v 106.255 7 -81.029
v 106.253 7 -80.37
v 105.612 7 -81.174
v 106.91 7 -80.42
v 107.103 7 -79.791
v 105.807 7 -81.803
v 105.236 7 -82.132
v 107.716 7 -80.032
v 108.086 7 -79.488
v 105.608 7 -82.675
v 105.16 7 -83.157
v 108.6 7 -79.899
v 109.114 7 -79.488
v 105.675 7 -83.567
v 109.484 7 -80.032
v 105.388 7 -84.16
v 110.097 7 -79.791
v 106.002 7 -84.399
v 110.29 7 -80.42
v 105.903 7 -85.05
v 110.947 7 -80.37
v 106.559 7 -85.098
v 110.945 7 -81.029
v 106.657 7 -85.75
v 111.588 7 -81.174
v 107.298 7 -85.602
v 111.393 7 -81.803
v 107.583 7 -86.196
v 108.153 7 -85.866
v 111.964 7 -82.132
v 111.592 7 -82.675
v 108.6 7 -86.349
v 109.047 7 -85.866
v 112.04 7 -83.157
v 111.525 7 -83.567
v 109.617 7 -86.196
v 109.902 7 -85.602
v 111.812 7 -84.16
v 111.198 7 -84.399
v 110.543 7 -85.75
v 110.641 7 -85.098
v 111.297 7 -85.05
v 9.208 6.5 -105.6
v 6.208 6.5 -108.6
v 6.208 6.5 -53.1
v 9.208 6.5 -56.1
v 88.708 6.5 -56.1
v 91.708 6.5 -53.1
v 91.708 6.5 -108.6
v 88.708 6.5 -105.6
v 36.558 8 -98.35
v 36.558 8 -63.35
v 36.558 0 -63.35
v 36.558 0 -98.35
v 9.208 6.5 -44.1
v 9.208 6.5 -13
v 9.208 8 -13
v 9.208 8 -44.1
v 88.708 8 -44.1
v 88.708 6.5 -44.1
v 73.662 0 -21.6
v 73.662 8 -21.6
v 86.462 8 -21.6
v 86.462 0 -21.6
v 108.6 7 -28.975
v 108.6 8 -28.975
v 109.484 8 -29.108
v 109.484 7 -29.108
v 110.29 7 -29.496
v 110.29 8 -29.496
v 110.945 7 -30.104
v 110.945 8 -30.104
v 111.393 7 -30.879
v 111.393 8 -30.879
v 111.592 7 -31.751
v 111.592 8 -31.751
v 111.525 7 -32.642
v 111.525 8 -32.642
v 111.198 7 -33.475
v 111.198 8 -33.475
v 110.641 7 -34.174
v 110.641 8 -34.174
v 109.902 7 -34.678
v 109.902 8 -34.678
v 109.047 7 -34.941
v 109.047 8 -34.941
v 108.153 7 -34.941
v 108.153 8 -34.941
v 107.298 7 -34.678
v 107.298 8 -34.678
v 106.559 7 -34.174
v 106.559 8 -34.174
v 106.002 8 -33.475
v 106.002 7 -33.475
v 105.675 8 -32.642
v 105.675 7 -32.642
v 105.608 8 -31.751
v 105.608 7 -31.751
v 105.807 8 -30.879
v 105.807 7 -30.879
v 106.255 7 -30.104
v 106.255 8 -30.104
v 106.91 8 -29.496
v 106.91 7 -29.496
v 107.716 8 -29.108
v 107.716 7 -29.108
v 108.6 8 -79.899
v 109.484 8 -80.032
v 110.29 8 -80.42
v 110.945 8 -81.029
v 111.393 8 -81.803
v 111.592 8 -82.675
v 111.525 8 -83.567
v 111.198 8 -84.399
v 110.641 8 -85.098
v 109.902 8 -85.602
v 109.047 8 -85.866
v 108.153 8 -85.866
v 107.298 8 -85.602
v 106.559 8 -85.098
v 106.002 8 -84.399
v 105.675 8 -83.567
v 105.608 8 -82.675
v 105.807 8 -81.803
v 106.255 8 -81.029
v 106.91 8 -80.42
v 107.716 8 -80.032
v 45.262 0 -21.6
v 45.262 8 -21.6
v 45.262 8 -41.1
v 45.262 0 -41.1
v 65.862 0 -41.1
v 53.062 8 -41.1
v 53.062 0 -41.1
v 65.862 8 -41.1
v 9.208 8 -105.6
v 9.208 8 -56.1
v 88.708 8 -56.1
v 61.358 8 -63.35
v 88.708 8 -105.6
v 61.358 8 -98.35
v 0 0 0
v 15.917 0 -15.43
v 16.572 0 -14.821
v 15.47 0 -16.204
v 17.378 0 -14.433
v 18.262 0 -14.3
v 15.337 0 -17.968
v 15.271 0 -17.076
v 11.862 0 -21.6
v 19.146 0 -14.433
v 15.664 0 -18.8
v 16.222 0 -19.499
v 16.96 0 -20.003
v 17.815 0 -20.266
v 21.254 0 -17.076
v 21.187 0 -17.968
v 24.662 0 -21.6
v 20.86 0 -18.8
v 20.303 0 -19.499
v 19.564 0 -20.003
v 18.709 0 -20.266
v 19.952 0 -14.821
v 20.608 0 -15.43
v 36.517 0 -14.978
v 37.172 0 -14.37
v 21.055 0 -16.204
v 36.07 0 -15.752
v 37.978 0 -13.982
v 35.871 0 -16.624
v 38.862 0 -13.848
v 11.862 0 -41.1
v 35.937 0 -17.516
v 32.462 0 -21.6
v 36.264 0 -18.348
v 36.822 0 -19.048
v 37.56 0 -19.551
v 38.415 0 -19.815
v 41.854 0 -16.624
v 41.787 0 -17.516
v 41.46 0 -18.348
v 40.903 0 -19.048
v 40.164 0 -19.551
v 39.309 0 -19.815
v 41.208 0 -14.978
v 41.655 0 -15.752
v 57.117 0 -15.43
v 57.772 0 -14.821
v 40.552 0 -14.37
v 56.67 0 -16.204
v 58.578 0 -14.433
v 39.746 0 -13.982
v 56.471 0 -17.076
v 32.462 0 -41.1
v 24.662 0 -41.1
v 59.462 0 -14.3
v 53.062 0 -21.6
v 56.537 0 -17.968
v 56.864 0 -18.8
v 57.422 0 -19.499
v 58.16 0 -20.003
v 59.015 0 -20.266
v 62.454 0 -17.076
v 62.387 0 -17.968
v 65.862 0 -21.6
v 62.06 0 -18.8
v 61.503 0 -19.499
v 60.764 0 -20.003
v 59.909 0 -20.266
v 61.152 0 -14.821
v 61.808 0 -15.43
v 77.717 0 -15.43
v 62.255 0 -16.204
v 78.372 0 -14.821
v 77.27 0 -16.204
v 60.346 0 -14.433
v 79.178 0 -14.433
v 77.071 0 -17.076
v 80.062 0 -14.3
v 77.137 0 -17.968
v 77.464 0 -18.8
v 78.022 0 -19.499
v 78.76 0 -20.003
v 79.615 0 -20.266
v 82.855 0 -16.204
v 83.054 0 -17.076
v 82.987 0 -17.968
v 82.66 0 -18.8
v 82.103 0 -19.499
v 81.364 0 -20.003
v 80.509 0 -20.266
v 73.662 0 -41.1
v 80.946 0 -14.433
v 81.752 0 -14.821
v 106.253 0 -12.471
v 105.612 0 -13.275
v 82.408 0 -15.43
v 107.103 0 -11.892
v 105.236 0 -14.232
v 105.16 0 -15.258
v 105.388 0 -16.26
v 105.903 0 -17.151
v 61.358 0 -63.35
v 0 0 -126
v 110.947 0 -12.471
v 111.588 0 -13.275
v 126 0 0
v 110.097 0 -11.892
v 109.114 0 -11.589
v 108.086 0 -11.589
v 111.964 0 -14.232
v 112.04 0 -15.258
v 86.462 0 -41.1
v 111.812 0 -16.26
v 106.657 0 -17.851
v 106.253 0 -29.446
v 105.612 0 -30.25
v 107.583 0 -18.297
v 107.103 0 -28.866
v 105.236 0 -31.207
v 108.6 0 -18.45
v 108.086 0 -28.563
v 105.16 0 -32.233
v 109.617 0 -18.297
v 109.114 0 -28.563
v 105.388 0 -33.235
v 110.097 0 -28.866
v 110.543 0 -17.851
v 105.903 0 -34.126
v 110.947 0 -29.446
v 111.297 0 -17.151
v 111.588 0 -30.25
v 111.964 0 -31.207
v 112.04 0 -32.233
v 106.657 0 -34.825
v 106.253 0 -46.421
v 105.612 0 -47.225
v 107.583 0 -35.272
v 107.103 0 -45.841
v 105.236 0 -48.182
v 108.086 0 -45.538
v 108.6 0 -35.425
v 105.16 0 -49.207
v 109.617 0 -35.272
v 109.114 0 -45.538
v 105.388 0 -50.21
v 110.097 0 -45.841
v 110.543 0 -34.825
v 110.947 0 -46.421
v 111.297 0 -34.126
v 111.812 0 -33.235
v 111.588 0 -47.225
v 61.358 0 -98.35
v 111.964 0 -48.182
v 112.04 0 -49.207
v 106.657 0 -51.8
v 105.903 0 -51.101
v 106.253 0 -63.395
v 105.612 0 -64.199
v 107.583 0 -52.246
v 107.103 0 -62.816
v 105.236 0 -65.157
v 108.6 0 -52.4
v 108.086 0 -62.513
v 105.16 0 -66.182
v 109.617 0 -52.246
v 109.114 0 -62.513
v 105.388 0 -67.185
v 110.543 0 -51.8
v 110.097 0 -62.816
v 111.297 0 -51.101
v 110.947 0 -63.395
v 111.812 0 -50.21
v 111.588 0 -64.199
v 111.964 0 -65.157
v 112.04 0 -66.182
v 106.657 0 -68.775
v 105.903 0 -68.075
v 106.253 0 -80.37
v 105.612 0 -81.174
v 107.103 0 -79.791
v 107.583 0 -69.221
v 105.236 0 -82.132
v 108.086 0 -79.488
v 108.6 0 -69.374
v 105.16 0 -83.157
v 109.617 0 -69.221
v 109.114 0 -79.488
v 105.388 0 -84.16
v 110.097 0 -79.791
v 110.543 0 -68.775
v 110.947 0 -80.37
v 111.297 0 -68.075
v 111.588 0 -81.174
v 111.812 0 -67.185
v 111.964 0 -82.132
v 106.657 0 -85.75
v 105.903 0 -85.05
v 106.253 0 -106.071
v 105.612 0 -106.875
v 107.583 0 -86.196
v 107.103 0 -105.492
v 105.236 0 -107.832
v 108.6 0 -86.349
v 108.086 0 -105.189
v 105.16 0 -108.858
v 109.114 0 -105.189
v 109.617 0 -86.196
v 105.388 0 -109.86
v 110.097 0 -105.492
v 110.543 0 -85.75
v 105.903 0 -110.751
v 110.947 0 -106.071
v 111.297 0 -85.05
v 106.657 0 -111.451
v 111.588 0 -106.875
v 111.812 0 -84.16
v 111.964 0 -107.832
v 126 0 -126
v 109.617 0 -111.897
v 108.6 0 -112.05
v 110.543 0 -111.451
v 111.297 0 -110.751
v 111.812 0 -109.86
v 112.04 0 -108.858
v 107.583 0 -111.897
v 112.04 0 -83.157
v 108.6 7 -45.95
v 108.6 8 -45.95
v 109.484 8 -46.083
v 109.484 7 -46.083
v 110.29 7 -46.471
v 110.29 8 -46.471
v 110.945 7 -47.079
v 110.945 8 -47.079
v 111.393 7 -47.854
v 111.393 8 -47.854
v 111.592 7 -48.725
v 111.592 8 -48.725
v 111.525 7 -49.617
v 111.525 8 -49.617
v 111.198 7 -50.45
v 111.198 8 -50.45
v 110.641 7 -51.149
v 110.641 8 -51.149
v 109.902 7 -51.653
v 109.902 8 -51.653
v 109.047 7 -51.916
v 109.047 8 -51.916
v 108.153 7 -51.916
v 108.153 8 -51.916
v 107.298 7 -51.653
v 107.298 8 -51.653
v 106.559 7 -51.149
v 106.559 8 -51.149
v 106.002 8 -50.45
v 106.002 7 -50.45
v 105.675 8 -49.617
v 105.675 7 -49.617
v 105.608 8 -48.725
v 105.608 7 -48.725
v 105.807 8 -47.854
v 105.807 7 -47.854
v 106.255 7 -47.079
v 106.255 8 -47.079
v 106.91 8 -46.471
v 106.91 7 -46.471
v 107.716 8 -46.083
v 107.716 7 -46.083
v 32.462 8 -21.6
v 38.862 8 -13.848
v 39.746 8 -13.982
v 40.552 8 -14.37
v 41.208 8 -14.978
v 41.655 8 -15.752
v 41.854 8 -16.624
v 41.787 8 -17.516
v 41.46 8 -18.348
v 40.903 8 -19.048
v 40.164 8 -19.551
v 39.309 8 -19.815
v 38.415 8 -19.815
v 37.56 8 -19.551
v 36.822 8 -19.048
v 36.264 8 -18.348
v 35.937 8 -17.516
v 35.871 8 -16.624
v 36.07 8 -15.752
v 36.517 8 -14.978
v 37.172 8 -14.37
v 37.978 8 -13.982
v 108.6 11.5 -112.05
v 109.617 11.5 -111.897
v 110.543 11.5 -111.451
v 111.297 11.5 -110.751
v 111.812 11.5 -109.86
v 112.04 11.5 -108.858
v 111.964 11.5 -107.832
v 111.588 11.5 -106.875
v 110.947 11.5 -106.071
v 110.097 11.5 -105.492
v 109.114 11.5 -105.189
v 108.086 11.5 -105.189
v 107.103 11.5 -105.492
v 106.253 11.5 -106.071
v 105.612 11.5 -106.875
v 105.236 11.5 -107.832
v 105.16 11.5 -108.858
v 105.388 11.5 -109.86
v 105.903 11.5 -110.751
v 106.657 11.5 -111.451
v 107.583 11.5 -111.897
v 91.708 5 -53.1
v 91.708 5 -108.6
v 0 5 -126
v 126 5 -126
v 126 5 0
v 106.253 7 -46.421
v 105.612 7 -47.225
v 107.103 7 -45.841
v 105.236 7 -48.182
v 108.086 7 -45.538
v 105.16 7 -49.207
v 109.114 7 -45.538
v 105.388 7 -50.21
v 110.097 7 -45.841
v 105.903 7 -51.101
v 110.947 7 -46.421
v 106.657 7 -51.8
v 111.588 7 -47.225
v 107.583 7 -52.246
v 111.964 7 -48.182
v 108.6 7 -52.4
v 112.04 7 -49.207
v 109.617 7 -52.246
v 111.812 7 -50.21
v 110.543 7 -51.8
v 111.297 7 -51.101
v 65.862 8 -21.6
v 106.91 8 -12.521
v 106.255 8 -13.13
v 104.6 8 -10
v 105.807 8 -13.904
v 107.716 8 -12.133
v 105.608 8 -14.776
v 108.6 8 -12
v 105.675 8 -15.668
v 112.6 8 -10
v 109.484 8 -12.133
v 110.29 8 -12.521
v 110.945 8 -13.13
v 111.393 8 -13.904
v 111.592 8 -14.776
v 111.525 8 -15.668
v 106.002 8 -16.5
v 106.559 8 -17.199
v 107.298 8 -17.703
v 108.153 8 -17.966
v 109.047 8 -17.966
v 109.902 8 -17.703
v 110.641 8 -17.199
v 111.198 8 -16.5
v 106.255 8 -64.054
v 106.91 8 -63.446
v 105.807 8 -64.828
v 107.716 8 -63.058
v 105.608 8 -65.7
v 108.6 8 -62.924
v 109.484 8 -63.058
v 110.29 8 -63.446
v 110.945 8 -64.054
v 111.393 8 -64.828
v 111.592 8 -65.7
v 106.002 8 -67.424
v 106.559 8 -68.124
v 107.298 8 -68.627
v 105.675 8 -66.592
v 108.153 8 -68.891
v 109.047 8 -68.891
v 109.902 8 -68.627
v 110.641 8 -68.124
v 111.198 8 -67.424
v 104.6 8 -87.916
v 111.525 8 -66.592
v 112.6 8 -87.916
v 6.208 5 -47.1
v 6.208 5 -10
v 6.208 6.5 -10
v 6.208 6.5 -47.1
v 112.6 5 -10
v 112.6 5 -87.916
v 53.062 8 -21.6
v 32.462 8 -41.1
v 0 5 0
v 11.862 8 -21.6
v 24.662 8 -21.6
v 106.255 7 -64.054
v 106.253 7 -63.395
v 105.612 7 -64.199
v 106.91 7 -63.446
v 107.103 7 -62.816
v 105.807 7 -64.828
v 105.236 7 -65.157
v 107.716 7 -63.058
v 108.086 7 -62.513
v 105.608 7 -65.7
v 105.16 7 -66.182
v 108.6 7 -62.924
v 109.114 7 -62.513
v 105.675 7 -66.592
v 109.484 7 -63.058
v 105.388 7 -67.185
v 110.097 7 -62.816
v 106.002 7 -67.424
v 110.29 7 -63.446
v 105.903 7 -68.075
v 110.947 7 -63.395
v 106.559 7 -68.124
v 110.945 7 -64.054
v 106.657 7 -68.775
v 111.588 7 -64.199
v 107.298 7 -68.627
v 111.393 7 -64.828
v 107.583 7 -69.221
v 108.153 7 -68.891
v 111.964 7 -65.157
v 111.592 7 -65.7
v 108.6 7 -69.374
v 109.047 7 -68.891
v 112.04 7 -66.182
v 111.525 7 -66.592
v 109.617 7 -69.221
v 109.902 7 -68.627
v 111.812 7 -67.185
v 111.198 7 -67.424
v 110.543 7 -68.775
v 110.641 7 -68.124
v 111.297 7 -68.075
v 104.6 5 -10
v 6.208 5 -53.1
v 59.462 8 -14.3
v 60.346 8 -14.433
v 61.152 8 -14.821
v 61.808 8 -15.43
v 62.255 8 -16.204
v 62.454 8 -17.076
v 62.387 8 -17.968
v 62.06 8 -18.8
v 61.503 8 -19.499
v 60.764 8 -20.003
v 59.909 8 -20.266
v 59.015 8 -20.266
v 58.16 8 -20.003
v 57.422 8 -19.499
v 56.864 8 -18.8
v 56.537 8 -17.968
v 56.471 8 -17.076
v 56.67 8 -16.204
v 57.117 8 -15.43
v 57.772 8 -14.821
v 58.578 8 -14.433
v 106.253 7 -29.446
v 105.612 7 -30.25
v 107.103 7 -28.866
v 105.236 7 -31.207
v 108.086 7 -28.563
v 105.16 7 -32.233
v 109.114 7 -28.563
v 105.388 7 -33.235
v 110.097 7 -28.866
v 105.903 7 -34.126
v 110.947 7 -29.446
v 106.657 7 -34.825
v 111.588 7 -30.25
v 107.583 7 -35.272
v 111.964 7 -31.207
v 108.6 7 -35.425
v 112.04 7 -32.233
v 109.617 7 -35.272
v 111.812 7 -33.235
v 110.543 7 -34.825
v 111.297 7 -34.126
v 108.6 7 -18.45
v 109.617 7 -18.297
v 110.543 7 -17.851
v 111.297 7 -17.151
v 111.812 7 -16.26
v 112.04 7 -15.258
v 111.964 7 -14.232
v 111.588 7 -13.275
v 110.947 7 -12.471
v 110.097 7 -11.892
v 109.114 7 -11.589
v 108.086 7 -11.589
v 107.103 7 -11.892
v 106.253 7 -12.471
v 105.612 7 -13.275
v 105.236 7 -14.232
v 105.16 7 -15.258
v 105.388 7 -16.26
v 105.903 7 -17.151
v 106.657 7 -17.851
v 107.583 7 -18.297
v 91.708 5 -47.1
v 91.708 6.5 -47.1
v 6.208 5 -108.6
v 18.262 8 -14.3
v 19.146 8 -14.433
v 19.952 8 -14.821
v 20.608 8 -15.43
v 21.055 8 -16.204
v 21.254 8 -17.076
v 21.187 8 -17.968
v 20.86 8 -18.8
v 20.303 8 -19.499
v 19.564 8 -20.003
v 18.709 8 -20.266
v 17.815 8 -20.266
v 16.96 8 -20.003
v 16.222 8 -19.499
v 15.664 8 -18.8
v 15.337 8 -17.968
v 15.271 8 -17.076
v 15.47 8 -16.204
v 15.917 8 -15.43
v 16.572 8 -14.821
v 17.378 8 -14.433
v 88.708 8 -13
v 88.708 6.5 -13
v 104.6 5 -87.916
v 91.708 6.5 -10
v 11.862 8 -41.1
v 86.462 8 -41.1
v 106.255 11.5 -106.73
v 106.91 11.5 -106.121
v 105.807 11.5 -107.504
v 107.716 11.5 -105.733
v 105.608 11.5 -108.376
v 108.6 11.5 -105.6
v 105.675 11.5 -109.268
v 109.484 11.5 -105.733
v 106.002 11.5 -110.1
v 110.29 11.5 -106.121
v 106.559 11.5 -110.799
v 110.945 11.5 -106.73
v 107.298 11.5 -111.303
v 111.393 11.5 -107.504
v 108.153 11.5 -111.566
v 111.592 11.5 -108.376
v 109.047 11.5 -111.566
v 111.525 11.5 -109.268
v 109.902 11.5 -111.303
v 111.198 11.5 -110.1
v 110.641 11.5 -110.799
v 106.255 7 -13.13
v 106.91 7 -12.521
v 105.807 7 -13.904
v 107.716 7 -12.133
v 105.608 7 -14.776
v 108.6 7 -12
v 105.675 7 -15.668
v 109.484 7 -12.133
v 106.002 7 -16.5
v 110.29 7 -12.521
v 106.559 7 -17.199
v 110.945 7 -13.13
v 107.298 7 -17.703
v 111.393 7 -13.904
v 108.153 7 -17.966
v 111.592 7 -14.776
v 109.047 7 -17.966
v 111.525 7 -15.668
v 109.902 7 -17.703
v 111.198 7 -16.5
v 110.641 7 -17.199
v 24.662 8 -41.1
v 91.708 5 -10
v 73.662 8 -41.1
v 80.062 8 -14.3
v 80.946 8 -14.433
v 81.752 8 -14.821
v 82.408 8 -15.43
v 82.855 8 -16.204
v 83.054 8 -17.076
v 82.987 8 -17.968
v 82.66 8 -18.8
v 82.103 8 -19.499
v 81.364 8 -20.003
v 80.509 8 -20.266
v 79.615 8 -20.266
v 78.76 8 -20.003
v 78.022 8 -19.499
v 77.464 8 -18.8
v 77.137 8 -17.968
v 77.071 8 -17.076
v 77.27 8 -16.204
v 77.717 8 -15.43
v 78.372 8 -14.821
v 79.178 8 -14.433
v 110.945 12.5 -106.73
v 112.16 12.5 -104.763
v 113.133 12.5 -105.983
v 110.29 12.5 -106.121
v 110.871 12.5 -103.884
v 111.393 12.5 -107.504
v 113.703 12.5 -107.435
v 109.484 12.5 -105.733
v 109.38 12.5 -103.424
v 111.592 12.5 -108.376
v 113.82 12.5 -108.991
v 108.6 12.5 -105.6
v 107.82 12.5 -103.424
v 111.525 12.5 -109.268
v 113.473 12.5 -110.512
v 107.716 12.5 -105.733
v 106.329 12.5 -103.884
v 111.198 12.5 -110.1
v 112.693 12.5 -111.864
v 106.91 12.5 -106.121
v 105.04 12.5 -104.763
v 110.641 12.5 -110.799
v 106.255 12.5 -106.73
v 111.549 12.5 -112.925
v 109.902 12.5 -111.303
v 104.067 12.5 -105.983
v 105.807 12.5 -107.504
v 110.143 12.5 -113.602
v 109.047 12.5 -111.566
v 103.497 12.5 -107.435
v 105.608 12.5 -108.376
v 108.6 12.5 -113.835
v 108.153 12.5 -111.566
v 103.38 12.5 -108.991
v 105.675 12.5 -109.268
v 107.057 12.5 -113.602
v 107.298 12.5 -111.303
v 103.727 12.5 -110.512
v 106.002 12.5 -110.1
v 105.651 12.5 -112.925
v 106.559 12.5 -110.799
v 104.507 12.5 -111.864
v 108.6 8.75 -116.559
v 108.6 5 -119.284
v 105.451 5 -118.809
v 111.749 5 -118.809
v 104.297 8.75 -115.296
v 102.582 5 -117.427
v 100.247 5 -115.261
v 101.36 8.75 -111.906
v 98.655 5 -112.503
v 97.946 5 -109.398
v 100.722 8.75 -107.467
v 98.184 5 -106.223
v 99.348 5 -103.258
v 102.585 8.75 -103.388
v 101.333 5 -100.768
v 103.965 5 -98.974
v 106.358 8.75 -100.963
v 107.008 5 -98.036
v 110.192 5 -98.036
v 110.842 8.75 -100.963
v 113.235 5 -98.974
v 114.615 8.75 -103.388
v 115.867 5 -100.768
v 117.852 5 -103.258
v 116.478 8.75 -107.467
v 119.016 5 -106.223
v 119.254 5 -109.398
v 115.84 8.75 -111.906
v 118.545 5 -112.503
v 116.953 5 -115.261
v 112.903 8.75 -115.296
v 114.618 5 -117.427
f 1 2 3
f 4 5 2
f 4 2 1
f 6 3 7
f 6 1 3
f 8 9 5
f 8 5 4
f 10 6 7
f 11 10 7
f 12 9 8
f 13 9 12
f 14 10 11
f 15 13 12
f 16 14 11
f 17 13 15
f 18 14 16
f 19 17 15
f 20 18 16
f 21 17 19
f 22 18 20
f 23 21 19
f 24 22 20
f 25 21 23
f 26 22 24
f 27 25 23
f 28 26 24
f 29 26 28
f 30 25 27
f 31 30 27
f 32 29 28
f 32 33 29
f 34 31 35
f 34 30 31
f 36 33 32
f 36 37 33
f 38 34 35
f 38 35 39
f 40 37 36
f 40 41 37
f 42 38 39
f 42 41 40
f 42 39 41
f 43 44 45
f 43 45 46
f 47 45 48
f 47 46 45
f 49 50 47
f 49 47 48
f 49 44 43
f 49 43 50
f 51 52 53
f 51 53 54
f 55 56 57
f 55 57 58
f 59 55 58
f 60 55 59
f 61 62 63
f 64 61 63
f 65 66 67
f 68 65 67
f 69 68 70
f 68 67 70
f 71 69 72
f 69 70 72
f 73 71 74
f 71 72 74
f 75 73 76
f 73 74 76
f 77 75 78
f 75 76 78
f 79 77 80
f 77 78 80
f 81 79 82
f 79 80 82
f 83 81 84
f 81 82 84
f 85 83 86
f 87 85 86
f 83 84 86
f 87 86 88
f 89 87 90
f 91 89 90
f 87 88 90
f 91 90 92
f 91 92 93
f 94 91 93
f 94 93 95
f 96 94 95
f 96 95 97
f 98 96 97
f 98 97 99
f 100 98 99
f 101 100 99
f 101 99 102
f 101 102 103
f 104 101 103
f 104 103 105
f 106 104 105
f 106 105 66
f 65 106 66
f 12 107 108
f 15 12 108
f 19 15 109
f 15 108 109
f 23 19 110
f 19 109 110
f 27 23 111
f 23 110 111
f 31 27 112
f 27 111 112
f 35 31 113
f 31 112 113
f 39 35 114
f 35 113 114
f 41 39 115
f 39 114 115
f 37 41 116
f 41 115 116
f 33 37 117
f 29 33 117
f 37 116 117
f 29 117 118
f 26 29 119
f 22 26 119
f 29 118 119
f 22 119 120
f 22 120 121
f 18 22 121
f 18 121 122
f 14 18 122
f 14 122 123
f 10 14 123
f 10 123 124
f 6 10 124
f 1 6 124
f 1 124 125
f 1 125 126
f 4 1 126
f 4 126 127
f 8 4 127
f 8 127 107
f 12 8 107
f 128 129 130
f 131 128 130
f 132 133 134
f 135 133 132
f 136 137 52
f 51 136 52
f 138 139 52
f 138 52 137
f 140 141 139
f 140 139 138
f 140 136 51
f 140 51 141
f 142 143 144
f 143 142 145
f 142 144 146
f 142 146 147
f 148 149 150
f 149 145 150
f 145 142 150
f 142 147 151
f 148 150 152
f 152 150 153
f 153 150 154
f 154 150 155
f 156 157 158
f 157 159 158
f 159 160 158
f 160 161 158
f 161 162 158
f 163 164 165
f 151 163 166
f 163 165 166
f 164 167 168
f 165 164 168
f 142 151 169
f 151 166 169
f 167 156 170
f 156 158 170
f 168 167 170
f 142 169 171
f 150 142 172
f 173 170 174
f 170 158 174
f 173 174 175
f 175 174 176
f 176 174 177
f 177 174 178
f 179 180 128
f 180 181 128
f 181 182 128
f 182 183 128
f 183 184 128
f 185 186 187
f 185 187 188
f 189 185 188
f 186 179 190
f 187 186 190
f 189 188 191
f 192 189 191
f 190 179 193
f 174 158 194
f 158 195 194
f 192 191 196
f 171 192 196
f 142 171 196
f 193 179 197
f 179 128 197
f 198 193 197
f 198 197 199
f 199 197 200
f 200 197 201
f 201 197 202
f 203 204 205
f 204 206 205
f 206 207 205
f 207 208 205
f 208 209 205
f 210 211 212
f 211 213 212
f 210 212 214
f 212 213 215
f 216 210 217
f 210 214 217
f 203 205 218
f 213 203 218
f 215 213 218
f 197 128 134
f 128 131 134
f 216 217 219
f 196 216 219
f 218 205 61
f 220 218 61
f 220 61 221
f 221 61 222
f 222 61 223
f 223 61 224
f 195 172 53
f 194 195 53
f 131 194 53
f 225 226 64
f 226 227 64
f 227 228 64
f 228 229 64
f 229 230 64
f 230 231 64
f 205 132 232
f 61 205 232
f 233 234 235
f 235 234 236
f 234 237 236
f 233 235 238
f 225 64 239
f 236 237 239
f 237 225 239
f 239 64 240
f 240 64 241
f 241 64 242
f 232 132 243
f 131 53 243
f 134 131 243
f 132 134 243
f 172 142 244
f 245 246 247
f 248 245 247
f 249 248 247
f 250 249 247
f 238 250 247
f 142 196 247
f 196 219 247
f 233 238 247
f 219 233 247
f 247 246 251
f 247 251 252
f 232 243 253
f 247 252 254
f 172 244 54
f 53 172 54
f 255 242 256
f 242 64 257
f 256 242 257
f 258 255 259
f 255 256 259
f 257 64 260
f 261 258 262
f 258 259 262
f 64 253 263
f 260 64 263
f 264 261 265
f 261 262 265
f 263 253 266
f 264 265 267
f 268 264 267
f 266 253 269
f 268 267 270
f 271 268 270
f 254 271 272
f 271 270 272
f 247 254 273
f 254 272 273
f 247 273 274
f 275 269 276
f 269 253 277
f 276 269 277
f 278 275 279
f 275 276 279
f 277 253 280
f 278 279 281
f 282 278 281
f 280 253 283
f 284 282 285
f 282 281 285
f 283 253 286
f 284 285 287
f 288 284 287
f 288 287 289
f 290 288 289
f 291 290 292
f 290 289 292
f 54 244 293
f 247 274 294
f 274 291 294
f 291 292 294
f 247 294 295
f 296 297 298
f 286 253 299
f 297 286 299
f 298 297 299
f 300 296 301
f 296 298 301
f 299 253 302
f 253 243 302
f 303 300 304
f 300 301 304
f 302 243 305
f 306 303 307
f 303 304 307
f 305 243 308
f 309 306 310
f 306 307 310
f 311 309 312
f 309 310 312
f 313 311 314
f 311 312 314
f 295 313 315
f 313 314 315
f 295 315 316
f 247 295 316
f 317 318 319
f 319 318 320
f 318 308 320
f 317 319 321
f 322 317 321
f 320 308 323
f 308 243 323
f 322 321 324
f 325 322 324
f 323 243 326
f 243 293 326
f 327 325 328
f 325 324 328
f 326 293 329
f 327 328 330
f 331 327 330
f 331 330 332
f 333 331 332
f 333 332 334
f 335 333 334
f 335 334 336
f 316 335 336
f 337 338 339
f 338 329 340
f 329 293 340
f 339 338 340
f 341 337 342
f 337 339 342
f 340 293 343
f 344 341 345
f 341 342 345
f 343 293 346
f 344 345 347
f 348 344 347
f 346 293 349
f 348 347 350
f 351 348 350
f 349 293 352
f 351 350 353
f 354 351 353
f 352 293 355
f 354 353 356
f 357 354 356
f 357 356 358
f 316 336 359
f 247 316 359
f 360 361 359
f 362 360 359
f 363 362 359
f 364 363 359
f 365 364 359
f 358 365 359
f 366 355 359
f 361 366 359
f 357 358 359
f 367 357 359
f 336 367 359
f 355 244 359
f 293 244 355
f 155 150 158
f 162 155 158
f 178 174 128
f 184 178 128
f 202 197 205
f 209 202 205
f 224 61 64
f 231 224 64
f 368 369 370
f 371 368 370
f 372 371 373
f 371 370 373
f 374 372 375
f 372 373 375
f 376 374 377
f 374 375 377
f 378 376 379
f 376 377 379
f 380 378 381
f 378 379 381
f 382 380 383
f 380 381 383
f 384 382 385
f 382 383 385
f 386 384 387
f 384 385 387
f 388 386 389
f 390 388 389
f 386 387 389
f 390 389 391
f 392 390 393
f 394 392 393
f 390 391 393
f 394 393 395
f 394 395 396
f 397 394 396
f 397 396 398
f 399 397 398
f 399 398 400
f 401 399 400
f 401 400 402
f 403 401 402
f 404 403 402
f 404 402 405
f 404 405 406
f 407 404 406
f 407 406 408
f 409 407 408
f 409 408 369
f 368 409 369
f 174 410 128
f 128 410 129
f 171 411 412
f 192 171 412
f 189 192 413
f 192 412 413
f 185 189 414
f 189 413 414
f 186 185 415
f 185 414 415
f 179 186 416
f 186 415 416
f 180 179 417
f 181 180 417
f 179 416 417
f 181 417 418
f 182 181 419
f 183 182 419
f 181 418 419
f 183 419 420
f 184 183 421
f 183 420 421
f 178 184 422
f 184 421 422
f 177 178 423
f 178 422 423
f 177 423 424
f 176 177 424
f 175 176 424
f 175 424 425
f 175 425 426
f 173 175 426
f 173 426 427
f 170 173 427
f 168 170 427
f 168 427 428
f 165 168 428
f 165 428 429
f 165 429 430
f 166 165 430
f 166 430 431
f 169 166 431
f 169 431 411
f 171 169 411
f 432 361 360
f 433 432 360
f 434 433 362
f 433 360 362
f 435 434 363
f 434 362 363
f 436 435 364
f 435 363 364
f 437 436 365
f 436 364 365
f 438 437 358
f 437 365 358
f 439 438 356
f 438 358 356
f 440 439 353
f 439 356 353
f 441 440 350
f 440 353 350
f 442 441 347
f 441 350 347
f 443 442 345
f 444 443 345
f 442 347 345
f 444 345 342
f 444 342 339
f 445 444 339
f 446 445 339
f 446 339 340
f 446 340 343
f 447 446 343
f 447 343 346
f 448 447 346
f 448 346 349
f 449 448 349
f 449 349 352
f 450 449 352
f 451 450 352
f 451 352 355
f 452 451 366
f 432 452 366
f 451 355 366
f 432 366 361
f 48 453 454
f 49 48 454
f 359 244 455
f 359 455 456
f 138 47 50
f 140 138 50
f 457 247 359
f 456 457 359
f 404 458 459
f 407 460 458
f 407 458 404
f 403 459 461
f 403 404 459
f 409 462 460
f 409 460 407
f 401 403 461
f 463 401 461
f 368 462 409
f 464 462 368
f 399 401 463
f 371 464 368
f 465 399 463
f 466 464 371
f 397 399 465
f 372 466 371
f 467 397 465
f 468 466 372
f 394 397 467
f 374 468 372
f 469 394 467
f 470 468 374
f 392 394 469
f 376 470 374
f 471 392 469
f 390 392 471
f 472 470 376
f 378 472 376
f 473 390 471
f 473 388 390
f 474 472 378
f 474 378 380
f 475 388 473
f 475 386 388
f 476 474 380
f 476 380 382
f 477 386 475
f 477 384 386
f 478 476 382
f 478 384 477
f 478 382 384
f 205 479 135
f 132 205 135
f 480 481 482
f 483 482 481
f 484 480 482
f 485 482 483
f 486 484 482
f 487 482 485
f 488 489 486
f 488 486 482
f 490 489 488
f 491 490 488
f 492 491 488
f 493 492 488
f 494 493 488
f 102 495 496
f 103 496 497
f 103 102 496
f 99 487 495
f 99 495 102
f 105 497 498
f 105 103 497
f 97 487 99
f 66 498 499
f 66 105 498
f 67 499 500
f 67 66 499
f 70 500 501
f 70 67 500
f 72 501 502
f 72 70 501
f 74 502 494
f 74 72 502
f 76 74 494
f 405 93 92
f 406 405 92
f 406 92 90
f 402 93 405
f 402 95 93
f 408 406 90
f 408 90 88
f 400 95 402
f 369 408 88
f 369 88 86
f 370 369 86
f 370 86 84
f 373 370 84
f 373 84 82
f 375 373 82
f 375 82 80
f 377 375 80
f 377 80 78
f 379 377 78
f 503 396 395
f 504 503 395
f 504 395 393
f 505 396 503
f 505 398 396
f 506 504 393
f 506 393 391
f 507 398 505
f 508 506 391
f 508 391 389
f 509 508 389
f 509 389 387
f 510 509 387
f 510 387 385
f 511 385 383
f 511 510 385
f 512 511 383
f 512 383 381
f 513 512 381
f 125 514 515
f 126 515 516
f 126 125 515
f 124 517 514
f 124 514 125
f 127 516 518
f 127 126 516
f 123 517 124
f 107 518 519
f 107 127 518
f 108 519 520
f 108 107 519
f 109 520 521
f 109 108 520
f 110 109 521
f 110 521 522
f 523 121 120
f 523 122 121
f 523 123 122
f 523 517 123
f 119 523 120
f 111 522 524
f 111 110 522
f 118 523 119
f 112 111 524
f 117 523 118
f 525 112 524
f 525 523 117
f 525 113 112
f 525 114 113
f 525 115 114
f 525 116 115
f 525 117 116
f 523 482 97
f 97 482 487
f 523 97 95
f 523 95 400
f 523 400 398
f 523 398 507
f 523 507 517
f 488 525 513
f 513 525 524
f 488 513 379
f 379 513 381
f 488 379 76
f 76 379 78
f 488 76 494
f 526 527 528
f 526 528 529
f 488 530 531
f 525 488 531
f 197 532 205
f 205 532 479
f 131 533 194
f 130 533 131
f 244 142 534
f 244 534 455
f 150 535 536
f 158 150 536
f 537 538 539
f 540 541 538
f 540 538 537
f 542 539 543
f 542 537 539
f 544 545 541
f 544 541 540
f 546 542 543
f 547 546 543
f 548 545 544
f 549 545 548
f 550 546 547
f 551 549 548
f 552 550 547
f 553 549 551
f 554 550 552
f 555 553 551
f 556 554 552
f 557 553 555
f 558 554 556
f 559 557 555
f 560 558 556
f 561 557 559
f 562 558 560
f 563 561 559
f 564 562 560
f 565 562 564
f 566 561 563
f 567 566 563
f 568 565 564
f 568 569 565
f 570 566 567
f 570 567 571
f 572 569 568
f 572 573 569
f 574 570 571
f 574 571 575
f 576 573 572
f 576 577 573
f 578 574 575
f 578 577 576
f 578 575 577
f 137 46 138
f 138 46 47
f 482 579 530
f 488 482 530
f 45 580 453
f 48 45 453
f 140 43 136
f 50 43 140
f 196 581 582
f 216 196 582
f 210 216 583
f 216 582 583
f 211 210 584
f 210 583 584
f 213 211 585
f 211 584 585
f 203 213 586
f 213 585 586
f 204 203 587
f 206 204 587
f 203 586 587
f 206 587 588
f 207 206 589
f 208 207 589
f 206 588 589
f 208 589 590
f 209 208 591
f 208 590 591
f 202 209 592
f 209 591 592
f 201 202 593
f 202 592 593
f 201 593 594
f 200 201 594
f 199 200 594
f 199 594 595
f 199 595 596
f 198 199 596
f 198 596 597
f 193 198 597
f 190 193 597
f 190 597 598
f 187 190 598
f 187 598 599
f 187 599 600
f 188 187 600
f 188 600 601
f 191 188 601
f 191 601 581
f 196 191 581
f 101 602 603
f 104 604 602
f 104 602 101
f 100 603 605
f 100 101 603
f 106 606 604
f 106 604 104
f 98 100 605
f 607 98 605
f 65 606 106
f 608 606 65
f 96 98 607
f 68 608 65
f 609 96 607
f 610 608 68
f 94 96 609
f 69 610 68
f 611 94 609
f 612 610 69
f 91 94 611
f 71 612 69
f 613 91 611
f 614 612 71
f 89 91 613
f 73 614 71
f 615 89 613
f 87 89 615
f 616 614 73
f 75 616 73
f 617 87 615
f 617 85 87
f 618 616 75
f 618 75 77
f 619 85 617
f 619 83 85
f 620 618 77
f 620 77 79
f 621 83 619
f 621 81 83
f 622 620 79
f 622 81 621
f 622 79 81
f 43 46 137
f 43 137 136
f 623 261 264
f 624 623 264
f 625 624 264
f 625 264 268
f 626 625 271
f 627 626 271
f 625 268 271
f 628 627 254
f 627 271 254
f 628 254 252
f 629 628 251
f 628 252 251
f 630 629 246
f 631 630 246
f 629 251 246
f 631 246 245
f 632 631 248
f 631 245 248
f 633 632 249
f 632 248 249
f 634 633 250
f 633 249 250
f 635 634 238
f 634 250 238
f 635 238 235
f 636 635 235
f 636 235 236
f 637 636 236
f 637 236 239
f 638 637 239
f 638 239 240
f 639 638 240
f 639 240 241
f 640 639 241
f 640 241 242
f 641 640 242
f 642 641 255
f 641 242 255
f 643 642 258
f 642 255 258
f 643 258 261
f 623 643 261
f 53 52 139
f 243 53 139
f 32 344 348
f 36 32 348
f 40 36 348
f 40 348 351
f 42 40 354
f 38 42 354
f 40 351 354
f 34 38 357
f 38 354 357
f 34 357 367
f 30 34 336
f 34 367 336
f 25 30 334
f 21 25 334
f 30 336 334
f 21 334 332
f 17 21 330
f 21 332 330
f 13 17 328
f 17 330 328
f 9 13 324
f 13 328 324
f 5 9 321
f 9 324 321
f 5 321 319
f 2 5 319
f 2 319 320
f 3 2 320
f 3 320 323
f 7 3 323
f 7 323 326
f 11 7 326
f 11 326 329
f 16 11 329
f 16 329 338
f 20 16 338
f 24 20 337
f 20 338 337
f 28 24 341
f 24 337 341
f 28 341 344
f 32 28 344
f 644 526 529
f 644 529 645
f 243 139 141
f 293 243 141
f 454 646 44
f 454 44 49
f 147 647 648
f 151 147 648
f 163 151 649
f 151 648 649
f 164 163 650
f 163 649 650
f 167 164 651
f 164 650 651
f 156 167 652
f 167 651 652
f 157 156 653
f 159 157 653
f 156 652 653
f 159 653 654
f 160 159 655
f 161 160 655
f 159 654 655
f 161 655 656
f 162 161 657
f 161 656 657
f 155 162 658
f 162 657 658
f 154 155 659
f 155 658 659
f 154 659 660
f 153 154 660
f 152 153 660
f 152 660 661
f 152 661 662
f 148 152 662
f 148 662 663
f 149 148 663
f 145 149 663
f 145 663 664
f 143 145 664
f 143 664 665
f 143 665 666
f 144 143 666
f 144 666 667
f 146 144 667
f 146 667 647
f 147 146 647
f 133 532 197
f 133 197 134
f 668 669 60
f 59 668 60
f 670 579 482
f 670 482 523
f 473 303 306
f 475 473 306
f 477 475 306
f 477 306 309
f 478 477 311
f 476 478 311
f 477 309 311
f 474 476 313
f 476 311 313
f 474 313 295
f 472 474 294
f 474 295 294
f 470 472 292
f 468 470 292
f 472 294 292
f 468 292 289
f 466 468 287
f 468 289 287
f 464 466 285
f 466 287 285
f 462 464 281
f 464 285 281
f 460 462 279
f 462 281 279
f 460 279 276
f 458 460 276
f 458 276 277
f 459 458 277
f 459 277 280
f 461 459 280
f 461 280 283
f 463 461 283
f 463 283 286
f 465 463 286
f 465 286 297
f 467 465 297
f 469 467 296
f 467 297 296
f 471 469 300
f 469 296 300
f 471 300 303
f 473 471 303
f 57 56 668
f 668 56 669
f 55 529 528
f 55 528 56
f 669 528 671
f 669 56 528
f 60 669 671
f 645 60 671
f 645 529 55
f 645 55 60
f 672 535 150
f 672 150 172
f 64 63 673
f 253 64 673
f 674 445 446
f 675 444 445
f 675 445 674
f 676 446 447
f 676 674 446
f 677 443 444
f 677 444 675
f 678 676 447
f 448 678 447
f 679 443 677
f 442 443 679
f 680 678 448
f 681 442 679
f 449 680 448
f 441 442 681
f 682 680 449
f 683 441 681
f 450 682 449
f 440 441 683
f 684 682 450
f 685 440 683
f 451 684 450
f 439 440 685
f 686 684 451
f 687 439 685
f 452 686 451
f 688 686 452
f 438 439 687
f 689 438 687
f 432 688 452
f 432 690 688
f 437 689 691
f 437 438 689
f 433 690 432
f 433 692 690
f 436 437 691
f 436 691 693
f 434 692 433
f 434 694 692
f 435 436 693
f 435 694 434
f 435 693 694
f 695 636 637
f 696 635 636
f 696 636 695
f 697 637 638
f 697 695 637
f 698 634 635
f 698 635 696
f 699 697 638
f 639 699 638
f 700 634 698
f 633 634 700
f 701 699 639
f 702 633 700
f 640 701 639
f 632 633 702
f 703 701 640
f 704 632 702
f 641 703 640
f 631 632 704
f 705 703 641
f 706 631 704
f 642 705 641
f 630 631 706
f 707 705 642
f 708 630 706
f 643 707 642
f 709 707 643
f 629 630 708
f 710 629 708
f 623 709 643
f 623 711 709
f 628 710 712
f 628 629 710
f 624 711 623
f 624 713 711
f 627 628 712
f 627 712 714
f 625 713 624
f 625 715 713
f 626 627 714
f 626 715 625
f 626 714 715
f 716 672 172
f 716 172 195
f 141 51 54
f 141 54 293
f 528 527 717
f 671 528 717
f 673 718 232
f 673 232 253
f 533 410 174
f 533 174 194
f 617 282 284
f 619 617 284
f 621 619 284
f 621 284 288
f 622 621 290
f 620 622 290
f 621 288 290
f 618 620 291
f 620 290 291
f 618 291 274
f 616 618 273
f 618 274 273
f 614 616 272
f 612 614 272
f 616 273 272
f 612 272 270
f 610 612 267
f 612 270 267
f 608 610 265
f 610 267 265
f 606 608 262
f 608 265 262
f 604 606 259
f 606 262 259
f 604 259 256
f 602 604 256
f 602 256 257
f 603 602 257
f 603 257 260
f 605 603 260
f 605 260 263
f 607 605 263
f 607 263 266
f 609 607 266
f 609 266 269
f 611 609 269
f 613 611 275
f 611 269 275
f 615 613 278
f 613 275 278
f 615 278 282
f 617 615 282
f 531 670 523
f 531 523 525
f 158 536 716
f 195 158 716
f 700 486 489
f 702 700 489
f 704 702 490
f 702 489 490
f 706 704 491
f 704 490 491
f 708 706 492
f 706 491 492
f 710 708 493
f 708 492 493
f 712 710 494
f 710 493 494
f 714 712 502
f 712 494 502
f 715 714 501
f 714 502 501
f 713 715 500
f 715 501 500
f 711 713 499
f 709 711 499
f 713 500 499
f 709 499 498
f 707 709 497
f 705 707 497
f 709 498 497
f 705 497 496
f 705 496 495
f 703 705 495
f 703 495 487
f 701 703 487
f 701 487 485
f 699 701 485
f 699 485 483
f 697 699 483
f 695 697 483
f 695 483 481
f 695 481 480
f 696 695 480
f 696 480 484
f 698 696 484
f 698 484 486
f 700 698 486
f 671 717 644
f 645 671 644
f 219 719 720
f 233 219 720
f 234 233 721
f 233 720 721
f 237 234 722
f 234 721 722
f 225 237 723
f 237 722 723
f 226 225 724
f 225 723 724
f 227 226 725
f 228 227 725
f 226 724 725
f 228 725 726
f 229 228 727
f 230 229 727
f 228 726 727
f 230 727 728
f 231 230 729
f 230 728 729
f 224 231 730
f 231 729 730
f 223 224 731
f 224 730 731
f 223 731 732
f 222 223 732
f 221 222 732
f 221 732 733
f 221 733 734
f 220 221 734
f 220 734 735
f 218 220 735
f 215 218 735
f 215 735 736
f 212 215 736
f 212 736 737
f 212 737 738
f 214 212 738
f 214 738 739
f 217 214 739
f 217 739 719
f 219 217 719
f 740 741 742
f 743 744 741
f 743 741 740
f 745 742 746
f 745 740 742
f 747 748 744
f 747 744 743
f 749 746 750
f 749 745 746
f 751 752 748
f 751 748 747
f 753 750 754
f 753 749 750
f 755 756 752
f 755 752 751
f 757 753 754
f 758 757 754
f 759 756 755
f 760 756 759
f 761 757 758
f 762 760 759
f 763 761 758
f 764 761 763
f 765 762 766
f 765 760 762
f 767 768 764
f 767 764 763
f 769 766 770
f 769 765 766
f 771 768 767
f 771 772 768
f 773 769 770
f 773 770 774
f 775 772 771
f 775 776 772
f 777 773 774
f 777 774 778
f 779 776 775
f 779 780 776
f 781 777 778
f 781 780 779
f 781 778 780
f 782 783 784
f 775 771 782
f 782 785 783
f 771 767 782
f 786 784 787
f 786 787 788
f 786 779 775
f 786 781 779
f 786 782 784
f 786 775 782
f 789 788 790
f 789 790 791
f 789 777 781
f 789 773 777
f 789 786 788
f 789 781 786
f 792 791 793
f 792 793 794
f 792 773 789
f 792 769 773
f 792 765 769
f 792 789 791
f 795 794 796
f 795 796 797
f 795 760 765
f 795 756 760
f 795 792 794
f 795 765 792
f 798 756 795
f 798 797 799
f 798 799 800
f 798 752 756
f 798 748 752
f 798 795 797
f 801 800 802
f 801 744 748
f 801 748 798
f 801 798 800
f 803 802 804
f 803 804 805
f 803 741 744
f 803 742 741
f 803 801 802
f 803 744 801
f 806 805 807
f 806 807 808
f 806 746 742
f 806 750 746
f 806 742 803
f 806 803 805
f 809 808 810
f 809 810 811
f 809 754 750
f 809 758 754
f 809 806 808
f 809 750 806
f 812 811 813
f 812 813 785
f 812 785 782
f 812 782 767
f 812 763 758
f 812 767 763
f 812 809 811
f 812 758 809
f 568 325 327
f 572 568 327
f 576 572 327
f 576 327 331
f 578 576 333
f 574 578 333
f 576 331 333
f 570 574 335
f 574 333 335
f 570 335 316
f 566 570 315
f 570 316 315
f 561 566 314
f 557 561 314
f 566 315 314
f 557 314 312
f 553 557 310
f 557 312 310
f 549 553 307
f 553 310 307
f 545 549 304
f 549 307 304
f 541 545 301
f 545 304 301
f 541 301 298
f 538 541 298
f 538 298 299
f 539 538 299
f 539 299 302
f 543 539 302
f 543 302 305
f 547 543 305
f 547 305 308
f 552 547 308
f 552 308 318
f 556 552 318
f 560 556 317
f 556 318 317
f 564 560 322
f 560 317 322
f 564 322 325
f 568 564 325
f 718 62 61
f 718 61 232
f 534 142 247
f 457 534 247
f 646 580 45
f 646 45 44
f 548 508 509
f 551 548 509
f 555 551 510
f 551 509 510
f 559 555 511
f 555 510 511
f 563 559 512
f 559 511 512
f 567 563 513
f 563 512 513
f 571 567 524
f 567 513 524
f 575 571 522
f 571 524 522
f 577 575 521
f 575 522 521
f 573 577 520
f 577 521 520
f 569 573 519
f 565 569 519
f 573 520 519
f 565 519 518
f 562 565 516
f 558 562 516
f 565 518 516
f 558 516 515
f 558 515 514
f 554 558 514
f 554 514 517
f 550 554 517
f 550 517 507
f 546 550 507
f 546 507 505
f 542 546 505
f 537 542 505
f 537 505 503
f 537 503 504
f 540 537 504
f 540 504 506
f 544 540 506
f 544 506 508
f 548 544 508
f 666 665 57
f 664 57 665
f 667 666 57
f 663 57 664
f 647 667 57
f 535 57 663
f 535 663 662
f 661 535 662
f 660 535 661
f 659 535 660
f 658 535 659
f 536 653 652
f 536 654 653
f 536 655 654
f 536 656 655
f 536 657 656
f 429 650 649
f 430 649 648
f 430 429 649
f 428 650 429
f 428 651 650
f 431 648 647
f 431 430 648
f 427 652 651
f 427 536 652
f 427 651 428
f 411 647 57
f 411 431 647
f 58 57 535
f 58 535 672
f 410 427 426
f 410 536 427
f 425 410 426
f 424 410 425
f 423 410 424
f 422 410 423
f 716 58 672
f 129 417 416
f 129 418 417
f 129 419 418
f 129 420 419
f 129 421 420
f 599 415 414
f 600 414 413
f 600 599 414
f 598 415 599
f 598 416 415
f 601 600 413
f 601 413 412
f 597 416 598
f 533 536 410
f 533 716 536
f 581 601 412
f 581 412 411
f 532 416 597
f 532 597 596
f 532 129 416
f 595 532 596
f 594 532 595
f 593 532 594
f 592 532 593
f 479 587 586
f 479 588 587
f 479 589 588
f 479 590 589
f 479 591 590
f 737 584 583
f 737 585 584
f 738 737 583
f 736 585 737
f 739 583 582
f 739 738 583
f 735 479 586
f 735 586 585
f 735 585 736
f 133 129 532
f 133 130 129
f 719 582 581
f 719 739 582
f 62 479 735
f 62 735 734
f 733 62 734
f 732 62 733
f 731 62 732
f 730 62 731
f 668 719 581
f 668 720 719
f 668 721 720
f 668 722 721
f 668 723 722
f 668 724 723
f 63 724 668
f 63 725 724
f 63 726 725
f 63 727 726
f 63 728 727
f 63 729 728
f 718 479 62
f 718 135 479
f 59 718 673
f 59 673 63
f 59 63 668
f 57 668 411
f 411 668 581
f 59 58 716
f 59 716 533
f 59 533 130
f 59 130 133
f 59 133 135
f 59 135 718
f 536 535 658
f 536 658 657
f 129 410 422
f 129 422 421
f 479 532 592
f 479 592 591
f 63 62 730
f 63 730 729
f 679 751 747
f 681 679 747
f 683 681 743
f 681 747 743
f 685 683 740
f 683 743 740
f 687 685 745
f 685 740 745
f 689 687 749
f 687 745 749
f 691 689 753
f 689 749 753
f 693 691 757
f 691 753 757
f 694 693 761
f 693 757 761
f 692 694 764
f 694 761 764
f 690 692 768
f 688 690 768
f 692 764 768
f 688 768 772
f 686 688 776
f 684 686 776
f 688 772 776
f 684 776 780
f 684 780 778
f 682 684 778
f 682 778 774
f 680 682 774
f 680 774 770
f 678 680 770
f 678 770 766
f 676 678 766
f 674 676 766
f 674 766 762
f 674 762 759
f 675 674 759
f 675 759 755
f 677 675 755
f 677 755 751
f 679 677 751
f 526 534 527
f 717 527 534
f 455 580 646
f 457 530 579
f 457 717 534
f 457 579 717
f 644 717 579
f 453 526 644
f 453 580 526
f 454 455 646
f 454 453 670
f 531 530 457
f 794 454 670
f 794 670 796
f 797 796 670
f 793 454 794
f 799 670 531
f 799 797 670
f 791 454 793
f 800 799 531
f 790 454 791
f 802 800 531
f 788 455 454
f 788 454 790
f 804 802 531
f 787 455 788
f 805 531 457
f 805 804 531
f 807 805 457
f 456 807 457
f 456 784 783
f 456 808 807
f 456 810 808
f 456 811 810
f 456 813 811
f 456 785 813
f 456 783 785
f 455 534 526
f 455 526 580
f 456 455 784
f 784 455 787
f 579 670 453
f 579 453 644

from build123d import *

# Parameters (mm, degrees)
SKETCH1_W           = 126
SKETCH1_H           = 126
BOSS_EXTRUDE1_DEPTH = 5
SKETCH3_R           = 12.5
BOSS_EXTRUDE2_DEPTH = 7.5
SKETCH4_R           = 3.45
CUT_EXTRUDE1_DEPTH  = 11.5
SKETCH6_R           = 3
CUT_EXTRUDE2_DEPTH  = 179.628805068
CHAMFER1_SIZE       = 10
CHAMFER1_SIZE_2     = 7.26542528
SKETCH7_W           = 8
SKETCH7_H           = 77.91635632
BOSS_EXTRUDE3_DEPTH = 3
SKETCH8_R           = 3
CUT_EXTRUDE3_DEPTH  = 179.370401132
SKETCH9_R           = 3.45
CUT_EXTRUDE4_DEPTH  = 7
SKETCH10_W          = 85.5
SKETCH10_H          = 55.5
SKETCH10_H_2        = 37.1
SKETCH10_W_2        = 73.5
SKETCH10_H_3        = 19.1
SKETCH10_W_3        = 36.75
SKETCH10_H_4        = 9.55
BOSS_EXTRUDE5_DEPTH = 1.5
SKETCH12_W          = 79.5
SKETCH12_H          = 49.5
BOSS_EXTRUDE6_DEPTH = 1.5
SKETCH13_W          = 79.5
SKETCH13_H          = 31.1
BOSS_EXTRUDE7_DEPTH = 1.5
SKETCH14_W          = 24.8
SKETCH14_H          = 35
CUT_EXTRUDE5_DEPTH  = 179.370401132
SKETCH15_W          = 12.8
SKETCH15_H          = 19.5
CUT_EXTRUDE6_DEPTH  = 179.370401132
SKETCH16_R          = 3
CUT_EXTRUDE7_DEPTH  = 179.370401132


with BuildPart() as part:
    # Sketch1 → Boss-Extrude1 (new body)
    with BuildSketch(Plane(origin=(0, 0, 0), x_dir=(1, 0, 0), z_dir=(0, 1, 0))):
        with Locations((63, 63)):
            Rectangle(SKETCH1_W, SKETCH1_H)
    extrude(amount=BOSS_EXTRUDE1_DEPTH)

    # Sketch3 → Boss-Extrude2 (add)
    with BuildSketch(Plane(origin=(0, 5, 0), x_dir=(1, 0, 0), z_dir=(0, 1, 0))):
        with Locations(Location((108.6, 108.6, 0), (0, 0, 90))):
            Circle(SKETCH3_R)
    extrude(amount=BOSS_EXTRUDE2_DEPTH)

    # Sketch4 → Cut-Extrude1 (cut)
    with BuildSketch(Plane.XZ):
        with Locations(Location((108.6, -108.6, 0), (0, 0, 270))):
            Circle(SKETCH4_R)
    extrude(amount=-CUT_EXTRUDE1_DEPTH, mode=Mode.SUBTRACT)

    # Sketch6 → Cut-Extrude2 (cut, through all)
    with BuildSketch(Plane(origin=(0, 12.5, 0), x_dir=(1, 0, 0), z_dir=(0, 1, 0))):
        with Locations(Location((108.6, 108.6, 0), (0, 0, 270))):
            Circle(SKETCH6_R)
    extrude(amount=-CUT_EXTRUDE2_DEPTH, mode=Mode.SUBTRACT)

    # Chamfer1
    # the kernel refuses this chamfer: 10, 7.26542528 mm, written as the material it takes off along each edge
    with BuildSketch(Plane(origin=(108.6, 12.5, -108.6), x_dir=(0, 0, -1), z_dir=(1, 0, 0))) as chamfer1_piece_1_section:
        Polygon((12.5, -CHAMFER1_SIZE), (12.5 - CHAMFER1_SIZE_2, 0), (12.5, 0), align=None)
    chamfer1_piece_1 = revolve(axis=Axis((108.6, 12.5, -108.6), (0, 1, 0)), mode=Mode.PRIVATE)
    chamfer1_piece_1 = split(chamfer1_piece_1, bisect_by=Plane(origin=(108.6, 5, -100.650989912), z_dir=(0, 1, 0)), keep=Keep.TOP, mode=Mode.PRIVATE)
    add(chamfer1_piece_1, mode=Mode.SUBTRACT)

    # Sketch7 → Boss-Extrude3 (add)
    with BuildSketch(Plane(origin=(0, 5, 0), x_dir=(1, 0, 0), z_dir=(0, 1, 0))):
        with Locations((108.6, 48.95817816)):
            Rectangle(SKETCH7_W, SKETCH7_H)
    extrude(amount=BOSS_EXTRUDE3_DEPTH)

    # Sketch8 → Cut-Extrude3 (cut, through all)
    with BuildSketch(Plane(origin=(0, 8, 0), x_dir=(1, 0, 0), z_dir=(0, 1, 0))):
        with Locations(Location((108.6, 15, 0), (0, 0, 270))):
            Circle(SKETCH8_R)
        with Locations(Location((108.6, 31.974801407, 0), (0, 0, 270))):
            Circle(SKETCH8_R)
        with Locations(Location((108.6, 48.949602814, 0), (0, 0, 270))):
            Circle(SKETCH8_R)
        with Locations(Location((108.6, 65.924404221, 0), (0, 0, 270))):
            Circle(SKETCH8_R)
        with Locations(Location((108.6, 82.899205628, 0), (0, 0, 270))):
            Circle(SKETCH8_R)
    extrude(amount=-CUT_EXTRUDE3_DEPTH, mode=Mode.SUBTRACT)

    # Sketch9 → Cut-Extrude4 (cut)
    with BuildSketch(Plane.XZ):
        with Locations(Location((108.6, -82.899205628, 0), (0, 0, 270))):
            Circle(SKETCH9_R)
        with Locations(Location((108.6, -65.924404221, 0), (0, 0, 270))):
            Circle(SKETCH9_R)
        with Locations(Location((108.6, -48.949602814, 0), (0, 0, 270))):
            Circle(SKETCH9_R)
        with Locations(Location((108.6, -15, 0), (0, 0, 270))):
            Circle(SKETCH9_R)
        with Locations(Location((108.6, -31.974801407, 0), (0, 0, 270))):
            Circle(SKETCH9_R)
    extrude(amount=-CUT_EXTRUDE4_DEPTH, mode=Mode.SUBTRACT)

    # Sketch10 → Boss-Extrude5 (add)
    # profile 1 of 6: a face of its own
    with BuildSketch(Plane(origin=(0, 5, 0), x_dir=(1, 0, 0), z_dir=(0, 1, 0))):
        with Locations((48.95817816, 80.85)):
            Rectangle(SKETCH10_W, SKETCH10_H)
    # profile 2 of 6: a face of its own
    with BuildSketch(Plane(origin=(0, 5, 0), x_dir=(1, 0, 0), z_dir=(0, 1, 0))):
        with Locations((48.95817816, 28.55)):
            Rectangle(SKETCH10_W, SKETCH10_H_2)
        with Locations((48.95817816, 31.55)):
            Rectangle(SKETCH10_W_2, SKETCH10_H_3, mode=Mode.SUBTRACT)
    # profile 3 of 6: a face of its own
    with BuildSketch(Plane(origin=(0, 5, 0), x_dir=(1, 0, 0), z_dir=(0, 1, 0))):
        with Locations((30.58317816, 26.775)):
            Rectangle(SKETCH10_W_3, SKETCH10_H_4)
    # profile 4 of 6: a face of its own
    with BuildSketch(Plane(origin=(0, 5, 0), x_dir=(1, 0, 0), z_dir=(0, 1, 0))):
        with Locations((30.58317816, 36.325)):
            Rectangle(SKETCH10_W_3, SKETCH10_H_4)
    # profile 5 of 6: a face of its own
    with BuildSketch(Plane(origin=(0, 5, 0), x_dir=(1, 0, 0), z_dir=(0, 1, 0))):
        with Locations((67.33317816, 36.325)):
            Rectangle(SKETCH10_W_3, SKETCH10_H_4)
    # profile 6 of 6: a face of its own
    with BuildSketch(Plane(origin=(0, 5, 0), x_dir=(1, 0, 0), z_dir=(0, 1, 0))):
        with Locations((67.33317816, 26.775)):
            Rectangle(SKETCH10_W_3, SKETCH10_H_4)
    extrude(amount=BOSS_EXTRUDE5_DEPTH)

    # Sketch12 → Boss-Extrude6 (add)
    with BuildSketch(Plane(origin=(0, 6.5, 0), x_dir=(1, 0, 0), z_dir=(0, 1, 0))):
        with Locations((48.95817816, 80.85)):
            Rectangle(SKETCH12_W, SKETCH12_H)
    extrude(amount=BOSS_EXTRUDE6_DEPTH)

    # Sketch13 → Boss-Extrude7 (add)
    with BuildSketch(Plane(origin=(0, 6.5, 0), x_dir=(1, 0, 0), z_dir=(0, 1, 0))):
        with Locations((48.95817816, 28.55)):
            Rectangle(SKETCH13_W, SKETCH13_H)
    extrude(amount=BOSS_EXTRUDE7_DEPTH)

    # Sketch14 → Cut-Extrude5 (cut, through all)
    with BuildSketch(Plane(origin=(0, 8, 0), x_dir=(1, 0, 0), z_dir=(0, 1, 0))):
        with Locations((48.95817816, 80.85)):
            Rectangle(SKETCH14_W, SKETCH14_H)
    extrude(amount=-CUT_EXTRUDE5_DEPTH, mode=Mode.SUBTRACT)

    # Sketch15 → Cut-Extrude6 (cut, through all)
    with BuildSketch(Plane(origin=(0, 8, 0), x_dir=(1, 0, 0), z_dir=(0, 1, 0))):
        with Locations((38.862130436, 31.35)):
            Rectangle(SKETCH15_W, SKETCH15_H)
        with Locations((18.262130436, 31.35)):
            Rectangle(SKETCH15_W, SKETCH15_H)
        with Locations((59.462130436, 31.35)):
            Rectangle(SKETCH15_W, SKETCH15_H)
        with Locations((80.062130436, 31.35)):
            Rectangle(SKETCH15_W, SKETCH15_H)
    extrude(amount=-CUT_EXTRUDE6_DEPTH, mode=Mode.SUBTRACT)

    # Sketch16 → Cut-Extrude7 (cut, through all)
    with BuildSketch(Plane(origin=(0, 8, 0), x_dir=(1, 0, 0), z_dir=(0, 1, 0))):
        with Locations(Location((18.262130436, 17.3, 0), (0, 0, 270))):
            Circle(SKETCH16_R)
        with Locations(Location((38.862130436, 16.84840868, 0), (0, 0, 270))):
            Circle(SKETCH16_R)
        with Locations(Location((59.462130436, 17.3, 0), (0, 0, 270))):
            Circle(SKETCH16_R)
        with Locations(Location((80.062130436, 17.3, 0), (0, 0, 270))):
            Circle(SKETCH16_R)
    extrude(amount=-CUT_EXTRUDE7_DEPTH, mode=Mode.SUBTRACT)


solid = part.part
